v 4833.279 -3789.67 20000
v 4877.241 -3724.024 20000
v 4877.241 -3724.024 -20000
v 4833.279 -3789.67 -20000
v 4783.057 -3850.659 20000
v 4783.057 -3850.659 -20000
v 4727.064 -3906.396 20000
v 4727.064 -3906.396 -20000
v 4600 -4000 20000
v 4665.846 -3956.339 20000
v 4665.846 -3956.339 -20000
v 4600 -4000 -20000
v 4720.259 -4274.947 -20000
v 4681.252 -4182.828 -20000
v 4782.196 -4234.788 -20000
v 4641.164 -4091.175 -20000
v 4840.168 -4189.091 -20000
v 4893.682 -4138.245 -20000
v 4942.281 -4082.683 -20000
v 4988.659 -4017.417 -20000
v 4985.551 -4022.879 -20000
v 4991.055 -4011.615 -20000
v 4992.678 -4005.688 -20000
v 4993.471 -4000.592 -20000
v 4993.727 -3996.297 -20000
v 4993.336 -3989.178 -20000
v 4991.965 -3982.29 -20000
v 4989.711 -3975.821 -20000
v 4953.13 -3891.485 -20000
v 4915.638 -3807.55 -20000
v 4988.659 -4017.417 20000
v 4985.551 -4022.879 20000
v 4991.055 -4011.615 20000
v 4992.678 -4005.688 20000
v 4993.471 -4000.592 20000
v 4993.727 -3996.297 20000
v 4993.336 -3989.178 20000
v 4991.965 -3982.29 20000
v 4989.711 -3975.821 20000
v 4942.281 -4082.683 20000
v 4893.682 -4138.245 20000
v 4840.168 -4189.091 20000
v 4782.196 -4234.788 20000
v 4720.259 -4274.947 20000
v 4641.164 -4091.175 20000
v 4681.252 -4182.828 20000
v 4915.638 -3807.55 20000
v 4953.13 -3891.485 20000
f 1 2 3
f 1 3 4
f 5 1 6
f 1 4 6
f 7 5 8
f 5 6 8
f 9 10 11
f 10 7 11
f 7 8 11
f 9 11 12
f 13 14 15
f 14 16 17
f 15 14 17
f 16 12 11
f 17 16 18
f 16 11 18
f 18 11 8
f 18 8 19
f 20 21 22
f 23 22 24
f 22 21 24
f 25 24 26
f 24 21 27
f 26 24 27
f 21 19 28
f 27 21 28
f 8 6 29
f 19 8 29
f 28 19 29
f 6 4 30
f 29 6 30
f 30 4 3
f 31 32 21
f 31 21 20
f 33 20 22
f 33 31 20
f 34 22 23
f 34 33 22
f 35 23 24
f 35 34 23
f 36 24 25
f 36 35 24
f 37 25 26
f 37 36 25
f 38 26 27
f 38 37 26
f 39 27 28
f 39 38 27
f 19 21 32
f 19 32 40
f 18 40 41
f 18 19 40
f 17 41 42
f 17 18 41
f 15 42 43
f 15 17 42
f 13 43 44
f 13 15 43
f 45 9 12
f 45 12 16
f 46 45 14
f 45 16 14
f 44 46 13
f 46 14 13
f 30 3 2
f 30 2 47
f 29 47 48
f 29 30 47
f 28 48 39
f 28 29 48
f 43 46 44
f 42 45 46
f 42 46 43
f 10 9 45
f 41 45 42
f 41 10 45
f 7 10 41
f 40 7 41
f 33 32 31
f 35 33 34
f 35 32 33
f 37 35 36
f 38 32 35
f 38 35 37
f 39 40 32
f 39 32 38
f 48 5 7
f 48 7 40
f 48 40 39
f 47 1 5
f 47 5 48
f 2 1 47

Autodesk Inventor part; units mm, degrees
ref_plane "YZ Plane" through (0, 0, 0) normal (1, 0, 0) x (0, 1, 0)
ref_plane "XZ Plane" through (0, 0, 0) normal (0, 1, 0) x (-1, 0, 0)
ref_plane "XY Plane" through (0, 0, 0) normal (0, 0, 1) x (1, 0, 0)
sketch "Sketch2" plane through (0, 0, 0) normal (0, 0, 1) x (1, 0, 0)
  arc A0 (5000, -4000) -> (4877.2412, -3724.0245) centre (-2826.475, -7316.0653) ccw
  arc A1 (4720.2587, -4274.9468) -> (4600, -4000) centre (-3126.3122, -7543.1766) ccw
  arc A2 (4720.2587, -4274.9468) -> (5000, -4000) centre (4316.4662, -3584.3299) ccw
  line L0 (149.7898, 300.1107) -> (0, 300.1107)
  line L1 (4600, -4000) -> (5418.8433, -4000) construction
  arc A3 (4600, -4000) -> (4877.2412, -3724.0245) centre (4191.359, -3312.2409) ccw
  point P0 (0, 0)
  point P1 (0, 700.233)
  dimension "d5" = 8500
  dimension "d20" = 800
extrude "Extrusion3" add sketch "Sketch2" along normal blind 20000 and the other way blind 20000
fillet "Fillet2" radius 50 1 edges at (5000, -4000, 0)
properties part number "curve_beam" material "Wood (Maple)"
